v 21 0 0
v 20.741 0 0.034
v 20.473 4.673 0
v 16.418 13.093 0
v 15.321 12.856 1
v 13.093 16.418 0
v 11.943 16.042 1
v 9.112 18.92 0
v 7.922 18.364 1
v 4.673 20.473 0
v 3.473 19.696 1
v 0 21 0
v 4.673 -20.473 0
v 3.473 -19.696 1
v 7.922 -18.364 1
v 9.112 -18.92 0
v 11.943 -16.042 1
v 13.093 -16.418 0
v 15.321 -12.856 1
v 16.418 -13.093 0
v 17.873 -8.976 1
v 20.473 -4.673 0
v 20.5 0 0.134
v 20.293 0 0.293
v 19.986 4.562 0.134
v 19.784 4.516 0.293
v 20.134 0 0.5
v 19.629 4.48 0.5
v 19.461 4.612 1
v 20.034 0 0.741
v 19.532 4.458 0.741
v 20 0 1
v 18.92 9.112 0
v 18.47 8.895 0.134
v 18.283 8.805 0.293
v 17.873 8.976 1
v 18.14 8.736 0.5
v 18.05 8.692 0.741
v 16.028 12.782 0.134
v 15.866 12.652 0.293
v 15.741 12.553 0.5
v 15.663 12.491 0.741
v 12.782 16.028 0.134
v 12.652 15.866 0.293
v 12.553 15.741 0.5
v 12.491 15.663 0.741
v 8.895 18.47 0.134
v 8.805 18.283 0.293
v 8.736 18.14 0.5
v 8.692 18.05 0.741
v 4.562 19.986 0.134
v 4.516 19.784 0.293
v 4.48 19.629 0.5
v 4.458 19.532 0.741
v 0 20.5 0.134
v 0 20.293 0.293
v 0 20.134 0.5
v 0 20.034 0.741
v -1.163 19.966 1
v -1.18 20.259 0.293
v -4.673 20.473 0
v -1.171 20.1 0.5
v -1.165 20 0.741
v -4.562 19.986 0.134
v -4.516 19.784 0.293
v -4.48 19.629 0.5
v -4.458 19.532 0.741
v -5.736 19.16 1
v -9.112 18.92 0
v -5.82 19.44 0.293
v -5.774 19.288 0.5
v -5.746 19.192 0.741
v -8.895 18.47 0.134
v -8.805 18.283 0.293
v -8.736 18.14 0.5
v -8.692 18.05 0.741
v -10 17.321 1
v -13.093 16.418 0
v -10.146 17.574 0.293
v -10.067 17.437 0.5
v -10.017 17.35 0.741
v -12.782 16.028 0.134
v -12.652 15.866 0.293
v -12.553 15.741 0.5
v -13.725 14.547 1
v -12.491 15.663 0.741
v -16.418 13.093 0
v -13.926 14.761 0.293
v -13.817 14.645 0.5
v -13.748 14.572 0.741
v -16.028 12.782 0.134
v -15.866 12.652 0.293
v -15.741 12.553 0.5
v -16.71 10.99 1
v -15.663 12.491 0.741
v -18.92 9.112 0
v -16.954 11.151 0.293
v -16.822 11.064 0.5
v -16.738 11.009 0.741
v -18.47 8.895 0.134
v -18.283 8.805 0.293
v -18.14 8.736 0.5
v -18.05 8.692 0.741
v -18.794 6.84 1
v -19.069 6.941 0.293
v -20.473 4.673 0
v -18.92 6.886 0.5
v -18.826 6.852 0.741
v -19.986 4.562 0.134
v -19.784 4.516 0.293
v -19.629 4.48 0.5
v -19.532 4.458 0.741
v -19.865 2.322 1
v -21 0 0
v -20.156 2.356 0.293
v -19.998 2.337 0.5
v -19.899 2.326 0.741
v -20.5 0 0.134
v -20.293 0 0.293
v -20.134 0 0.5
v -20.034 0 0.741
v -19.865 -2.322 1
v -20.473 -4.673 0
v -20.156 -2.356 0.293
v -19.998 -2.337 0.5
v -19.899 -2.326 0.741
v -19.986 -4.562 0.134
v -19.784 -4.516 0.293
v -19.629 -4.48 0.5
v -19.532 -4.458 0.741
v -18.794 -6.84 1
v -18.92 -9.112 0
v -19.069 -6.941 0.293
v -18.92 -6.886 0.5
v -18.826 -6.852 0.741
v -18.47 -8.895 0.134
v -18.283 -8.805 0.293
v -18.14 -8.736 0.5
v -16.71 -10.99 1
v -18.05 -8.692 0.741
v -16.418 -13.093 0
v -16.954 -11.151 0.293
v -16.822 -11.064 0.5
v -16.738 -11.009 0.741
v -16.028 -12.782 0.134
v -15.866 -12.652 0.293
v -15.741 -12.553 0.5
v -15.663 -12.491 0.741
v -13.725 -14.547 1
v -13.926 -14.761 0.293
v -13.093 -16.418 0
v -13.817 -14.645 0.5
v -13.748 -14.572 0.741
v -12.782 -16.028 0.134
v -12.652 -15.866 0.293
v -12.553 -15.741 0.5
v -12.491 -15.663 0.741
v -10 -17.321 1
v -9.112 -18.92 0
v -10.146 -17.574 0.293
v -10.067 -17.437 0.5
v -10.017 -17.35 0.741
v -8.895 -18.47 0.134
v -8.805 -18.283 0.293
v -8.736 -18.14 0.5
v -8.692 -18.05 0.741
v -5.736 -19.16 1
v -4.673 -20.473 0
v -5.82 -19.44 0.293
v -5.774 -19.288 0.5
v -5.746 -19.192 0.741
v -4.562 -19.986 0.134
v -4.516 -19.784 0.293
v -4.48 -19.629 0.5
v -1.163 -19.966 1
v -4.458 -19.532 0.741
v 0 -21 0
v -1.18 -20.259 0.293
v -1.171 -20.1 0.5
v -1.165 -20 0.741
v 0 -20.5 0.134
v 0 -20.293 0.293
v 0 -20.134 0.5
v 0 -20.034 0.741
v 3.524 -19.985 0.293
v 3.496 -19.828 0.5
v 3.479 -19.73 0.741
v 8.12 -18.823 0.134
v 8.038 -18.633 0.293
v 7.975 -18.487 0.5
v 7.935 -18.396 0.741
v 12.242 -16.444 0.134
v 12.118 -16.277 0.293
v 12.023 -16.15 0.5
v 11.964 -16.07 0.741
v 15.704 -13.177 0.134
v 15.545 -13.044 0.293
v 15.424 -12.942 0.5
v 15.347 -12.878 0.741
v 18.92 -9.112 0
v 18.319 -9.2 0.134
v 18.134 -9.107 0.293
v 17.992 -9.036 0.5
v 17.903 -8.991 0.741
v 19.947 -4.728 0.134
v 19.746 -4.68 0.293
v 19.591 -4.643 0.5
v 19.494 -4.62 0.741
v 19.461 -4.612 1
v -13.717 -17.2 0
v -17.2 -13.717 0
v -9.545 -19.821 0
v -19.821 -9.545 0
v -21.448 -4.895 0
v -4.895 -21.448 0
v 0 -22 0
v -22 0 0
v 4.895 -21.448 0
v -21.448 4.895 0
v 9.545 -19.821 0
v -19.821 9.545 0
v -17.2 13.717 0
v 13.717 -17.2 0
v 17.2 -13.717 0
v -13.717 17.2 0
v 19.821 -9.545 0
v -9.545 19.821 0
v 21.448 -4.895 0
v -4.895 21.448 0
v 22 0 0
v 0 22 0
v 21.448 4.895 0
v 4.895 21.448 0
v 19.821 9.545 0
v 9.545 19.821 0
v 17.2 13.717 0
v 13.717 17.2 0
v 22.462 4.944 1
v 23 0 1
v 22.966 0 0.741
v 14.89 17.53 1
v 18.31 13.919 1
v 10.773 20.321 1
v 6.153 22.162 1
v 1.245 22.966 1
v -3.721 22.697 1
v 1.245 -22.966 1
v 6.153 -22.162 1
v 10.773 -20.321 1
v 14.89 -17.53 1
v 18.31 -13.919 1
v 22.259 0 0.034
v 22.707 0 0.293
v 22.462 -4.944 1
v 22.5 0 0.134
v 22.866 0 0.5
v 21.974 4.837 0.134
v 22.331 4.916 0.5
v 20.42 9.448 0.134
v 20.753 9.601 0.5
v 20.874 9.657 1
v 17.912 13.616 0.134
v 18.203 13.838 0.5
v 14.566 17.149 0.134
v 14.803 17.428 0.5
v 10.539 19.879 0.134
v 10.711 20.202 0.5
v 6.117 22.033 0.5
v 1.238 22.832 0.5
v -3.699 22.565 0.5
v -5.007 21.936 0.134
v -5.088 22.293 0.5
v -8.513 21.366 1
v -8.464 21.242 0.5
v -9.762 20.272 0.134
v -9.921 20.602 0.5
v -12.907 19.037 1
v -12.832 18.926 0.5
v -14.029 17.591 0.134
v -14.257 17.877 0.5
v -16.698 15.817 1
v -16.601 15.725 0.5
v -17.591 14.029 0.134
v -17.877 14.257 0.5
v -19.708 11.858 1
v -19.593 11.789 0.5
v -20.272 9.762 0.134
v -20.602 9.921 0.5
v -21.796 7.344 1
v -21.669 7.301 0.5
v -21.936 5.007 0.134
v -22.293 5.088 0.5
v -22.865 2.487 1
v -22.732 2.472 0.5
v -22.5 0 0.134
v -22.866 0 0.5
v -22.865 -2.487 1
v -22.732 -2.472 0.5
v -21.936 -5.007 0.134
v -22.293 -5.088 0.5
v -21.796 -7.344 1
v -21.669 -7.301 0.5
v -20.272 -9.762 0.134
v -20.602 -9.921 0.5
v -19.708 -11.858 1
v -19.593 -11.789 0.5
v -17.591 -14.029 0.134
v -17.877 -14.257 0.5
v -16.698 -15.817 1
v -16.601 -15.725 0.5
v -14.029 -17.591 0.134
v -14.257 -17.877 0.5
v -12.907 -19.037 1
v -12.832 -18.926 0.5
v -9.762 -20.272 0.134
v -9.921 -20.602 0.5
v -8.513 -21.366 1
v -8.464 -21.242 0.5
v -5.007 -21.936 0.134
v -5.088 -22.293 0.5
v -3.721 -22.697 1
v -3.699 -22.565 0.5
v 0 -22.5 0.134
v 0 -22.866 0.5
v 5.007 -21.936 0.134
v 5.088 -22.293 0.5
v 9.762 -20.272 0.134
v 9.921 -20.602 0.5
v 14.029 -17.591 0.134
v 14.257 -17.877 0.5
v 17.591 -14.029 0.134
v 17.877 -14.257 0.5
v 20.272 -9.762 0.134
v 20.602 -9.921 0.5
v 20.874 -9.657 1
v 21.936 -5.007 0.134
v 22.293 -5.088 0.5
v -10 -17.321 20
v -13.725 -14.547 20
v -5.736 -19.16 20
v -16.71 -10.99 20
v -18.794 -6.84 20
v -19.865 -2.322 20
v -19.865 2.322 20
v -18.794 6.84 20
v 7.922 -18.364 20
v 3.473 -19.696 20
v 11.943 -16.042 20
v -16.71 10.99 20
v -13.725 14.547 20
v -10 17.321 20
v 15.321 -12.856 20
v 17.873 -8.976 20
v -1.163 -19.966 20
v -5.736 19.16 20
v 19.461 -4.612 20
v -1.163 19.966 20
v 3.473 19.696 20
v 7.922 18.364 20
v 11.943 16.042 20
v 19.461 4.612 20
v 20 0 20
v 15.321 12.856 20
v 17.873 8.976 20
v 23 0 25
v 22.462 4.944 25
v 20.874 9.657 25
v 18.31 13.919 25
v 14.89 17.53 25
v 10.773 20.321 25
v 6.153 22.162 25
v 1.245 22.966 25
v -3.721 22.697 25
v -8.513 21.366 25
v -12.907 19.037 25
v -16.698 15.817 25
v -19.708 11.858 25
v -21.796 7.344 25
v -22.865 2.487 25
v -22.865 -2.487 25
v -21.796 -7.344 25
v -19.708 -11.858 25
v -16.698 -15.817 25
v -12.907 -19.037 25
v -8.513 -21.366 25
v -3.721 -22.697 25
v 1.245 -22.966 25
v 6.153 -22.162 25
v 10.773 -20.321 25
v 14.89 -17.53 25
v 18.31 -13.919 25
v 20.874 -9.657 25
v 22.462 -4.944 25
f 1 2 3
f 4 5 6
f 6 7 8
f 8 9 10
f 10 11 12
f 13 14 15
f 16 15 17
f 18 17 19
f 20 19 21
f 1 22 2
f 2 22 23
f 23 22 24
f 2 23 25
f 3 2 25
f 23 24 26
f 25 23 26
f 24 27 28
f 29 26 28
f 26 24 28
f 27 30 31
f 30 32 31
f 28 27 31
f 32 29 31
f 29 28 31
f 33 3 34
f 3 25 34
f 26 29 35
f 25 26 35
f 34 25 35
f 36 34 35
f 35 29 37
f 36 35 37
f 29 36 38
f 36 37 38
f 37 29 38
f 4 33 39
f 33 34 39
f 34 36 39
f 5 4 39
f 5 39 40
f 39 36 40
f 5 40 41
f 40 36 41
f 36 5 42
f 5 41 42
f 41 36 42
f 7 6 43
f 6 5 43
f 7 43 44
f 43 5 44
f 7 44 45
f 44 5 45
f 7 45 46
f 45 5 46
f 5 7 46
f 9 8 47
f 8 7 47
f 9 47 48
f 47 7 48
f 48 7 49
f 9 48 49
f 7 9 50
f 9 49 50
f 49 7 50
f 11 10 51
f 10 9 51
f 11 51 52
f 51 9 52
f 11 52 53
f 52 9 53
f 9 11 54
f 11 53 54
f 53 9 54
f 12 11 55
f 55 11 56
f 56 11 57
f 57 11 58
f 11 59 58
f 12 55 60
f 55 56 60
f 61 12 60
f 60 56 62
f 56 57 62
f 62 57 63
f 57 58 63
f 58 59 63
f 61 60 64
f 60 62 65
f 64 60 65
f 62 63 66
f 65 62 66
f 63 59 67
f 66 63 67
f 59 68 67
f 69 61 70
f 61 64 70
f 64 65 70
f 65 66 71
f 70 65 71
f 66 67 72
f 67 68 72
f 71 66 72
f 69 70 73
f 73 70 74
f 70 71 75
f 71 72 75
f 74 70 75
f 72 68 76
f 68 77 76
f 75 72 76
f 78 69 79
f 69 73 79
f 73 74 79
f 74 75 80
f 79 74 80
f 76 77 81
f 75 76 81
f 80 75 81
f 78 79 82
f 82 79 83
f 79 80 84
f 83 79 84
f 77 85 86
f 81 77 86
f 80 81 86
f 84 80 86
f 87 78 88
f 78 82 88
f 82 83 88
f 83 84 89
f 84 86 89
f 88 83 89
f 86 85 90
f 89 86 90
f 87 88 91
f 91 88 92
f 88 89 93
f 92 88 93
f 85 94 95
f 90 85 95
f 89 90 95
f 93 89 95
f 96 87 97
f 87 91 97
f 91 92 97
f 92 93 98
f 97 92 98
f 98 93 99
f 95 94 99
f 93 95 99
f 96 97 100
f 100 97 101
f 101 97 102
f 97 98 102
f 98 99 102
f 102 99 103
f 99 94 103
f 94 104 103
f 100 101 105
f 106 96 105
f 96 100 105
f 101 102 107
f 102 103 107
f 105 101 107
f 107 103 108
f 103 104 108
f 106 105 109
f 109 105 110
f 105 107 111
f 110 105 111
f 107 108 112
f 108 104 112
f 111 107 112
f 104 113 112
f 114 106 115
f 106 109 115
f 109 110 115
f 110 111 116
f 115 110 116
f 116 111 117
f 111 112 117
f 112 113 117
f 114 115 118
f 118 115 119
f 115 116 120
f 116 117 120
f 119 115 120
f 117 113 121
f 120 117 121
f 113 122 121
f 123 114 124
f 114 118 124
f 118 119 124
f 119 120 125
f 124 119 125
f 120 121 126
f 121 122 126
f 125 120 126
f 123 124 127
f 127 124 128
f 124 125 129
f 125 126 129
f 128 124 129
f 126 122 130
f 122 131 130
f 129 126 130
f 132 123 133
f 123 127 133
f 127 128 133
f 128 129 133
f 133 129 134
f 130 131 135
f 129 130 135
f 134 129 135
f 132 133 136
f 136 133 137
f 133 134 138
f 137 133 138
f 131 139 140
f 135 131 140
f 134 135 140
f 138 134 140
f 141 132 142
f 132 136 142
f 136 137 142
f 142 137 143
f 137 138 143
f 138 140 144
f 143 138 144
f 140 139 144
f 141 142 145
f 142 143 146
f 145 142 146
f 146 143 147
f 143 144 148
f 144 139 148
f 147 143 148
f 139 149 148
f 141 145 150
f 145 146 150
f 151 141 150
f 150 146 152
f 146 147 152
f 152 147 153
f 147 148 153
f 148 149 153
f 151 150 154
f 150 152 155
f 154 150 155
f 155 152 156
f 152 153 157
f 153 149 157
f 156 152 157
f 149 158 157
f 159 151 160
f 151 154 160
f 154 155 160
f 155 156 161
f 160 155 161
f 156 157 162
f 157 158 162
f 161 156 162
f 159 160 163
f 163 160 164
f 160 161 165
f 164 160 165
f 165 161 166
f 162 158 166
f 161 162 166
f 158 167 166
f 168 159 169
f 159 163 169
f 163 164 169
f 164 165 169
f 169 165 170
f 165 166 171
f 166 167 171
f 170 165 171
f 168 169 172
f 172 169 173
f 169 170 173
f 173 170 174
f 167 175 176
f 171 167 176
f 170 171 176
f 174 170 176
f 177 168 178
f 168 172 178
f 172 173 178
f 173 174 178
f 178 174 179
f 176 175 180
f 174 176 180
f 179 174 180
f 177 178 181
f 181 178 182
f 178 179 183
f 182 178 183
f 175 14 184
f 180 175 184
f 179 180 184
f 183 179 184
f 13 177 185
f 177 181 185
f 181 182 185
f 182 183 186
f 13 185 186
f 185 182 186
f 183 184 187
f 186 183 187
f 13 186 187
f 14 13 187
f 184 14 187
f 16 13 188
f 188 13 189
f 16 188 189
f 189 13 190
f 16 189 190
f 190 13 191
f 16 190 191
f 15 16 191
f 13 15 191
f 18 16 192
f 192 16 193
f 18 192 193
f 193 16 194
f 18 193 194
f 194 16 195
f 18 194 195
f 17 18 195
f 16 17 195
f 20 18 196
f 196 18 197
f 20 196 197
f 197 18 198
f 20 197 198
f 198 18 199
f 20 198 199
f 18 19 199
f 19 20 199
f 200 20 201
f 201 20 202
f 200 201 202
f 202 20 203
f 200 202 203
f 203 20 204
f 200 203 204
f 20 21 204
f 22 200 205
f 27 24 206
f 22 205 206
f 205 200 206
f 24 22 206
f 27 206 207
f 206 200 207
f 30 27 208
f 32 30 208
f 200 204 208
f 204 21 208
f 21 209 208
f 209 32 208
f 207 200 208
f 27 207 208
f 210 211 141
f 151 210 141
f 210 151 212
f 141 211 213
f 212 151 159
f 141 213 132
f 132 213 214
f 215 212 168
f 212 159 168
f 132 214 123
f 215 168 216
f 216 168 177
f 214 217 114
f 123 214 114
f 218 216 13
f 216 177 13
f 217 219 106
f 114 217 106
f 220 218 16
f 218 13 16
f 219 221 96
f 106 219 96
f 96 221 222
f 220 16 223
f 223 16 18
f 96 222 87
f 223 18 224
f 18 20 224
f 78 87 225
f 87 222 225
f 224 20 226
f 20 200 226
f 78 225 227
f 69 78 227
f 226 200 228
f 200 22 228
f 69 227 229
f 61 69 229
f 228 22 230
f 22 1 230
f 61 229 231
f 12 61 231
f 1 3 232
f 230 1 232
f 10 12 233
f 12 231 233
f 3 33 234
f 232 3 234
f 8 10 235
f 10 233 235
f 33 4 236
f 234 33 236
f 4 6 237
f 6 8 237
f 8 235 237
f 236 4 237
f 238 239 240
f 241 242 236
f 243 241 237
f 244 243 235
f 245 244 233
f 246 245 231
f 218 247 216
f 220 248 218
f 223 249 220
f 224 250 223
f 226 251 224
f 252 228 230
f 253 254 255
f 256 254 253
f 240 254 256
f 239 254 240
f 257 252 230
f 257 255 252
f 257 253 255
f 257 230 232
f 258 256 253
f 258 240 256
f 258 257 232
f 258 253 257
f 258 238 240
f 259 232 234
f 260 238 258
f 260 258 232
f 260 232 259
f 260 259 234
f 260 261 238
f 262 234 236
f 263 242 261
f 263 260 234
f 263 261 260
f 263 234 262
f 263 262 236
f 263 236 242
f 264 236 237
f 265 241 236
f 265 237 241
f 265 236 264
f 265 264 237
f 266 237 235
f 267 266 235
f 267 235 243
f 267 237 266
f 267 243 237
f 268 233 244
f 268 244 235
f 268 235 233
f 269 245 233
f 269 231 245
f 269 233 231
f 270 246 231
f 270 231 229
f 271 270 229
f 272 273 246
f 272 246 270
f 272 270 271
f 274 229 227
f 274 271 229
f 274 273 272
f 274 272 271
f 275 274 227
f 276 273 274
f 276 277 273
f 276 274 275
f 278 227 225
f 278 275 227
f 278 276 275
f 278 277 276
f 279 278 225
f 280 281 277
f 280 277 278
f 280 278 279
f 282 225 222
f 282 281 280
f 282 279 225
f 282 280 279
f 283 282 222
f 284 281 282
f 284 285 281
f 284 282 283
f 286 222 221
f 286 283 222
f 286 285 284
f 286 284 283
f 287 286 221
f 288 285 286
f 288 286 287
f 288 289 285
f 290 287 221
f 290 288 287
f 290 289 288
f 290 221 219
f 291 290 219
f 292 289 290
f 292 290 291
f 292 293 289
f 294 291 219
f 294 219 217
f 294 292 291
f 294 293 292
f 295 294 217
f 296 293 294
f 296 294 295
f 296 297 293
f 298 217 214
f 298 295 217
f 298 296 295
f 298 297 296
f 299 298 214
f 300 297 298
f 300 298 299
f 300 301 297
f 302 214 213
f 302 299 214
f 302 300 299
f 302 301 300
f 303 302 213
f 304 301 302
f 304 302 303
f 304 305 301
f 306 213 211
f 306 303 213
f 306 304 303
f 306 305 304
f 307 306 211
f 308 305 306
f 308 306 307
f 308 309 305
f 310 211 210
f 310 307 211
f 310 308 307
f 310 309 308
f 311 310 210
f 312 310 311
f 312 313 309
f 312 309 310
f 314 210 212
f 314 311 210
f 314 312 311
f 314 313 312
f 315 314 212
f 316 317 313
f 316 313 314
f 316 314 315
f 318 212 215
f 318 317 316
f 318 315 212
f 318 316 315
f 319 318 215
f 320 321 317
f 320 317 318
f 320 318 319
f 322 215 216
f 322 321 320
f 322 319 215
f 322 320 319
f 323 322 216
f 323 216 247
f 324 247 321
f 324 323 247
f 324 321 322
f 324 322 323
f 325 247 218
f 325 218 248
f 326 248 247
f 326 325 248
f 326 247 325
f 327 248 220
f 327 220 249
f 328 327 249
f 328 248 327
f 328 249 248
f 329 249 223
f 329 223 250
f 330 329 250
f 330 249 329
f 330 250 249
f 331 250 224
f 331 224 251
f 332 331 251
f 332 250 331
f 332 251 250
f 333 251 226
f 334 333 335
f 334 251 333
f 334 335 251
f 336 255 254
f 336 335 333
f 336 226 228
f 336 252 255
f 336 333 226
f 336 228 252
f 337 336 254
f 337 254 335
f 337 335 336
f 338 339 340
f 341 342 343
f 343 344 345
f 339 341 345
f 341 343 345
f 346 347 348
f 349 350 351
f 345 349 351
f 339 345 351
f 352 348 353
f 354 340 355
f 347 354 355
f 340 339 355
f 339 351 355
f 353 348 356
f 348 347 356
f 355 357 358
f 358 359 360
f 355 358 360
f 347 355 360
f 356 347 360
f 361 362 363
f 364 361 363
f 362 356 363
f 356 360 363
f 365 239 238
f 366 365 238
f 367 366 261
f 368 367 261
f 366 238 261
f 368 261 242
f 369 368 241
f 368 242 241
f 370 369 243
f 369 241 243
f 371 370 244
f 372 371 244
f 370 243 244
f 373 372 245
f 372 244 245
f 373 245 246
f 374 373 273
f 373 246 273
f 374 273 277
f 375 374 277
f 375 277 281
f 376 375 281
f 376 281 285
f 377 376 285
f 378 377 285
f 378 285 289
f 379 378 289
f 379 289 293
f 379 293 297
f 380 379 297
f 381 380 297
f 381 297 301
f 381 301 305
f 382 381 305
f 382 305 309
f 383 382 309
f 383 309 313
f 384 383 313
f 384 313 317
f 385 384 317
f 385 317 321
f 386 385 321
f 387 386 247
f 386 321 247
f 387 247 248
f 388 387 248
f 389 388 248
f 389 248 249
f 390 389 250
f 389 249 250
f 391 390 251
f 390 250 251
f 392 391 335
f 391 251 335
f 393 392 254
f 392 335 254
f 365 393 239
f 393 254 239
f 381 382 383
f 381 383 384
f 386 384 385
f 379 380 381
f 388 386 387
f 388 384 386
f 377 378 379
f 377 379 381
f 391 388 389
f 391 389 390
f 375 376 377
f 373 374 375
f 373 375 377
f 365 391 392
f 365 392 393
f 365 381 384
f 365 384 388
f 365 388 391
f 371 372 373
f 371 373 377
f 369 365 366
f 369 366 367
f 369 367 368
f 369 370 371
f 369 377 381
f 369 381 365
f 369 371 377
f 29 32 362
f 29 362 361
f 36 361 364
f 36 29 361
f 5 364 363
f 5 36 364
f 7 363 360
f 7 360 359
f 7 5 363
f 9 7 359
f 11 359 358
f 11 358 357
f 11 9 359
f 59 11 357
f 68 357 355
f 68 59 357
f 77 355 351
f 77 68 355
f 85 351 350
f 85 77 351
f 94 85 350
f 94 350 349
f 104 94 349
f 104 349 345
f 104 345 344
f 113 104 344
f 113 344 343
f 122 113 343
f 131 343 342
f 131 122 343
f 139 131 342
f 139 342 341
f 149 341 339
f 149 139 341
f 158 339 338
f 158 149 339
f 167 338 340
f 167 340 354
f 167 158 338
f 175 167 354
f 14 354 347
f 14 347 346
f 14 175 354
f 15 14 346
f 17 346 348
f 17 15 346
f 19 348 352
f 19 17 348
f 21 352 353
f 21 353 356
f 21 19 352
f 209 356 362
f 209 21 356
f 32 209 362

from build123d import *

# Parameters (mm, degrees)
F0_R     = 23
F0_R_2   = 20
F1_DEPTH = 20
F2_R     = 23
F3_DEPTH = 5
F4_R     = 1
F5_R     = 1


with BuildPart() as f1:
    # F0 (on Top) → F1 (new body)
    with BuildSketch(Plane.XY):
        Circle(F0_R)
        Circle(F0_R_2, mode=Mode.SUBTRACT)
    extrude(amount=F1_DEPTH)

    # F2 (on face) → F3 (join)
    with BuildSketch(Plane.XY.offset(20)):
        Circle(F2_R)
    extrude(amount=F3_DEPTH)

    # F4
    f4_edges = [f1.edges().sort_by_distance(p)[0] for p in [
        (-20, 0, 0),
    ]]
    fillet(f4_edges, radius=F4_R)

    # F5
    f5_edges = [f1.edges().sort_by_distance(p)[0] for p in [
        (-23, 0, 0),
    ]]
    fillet(f5_edges, radius=F5_R)


solid = f1.part
